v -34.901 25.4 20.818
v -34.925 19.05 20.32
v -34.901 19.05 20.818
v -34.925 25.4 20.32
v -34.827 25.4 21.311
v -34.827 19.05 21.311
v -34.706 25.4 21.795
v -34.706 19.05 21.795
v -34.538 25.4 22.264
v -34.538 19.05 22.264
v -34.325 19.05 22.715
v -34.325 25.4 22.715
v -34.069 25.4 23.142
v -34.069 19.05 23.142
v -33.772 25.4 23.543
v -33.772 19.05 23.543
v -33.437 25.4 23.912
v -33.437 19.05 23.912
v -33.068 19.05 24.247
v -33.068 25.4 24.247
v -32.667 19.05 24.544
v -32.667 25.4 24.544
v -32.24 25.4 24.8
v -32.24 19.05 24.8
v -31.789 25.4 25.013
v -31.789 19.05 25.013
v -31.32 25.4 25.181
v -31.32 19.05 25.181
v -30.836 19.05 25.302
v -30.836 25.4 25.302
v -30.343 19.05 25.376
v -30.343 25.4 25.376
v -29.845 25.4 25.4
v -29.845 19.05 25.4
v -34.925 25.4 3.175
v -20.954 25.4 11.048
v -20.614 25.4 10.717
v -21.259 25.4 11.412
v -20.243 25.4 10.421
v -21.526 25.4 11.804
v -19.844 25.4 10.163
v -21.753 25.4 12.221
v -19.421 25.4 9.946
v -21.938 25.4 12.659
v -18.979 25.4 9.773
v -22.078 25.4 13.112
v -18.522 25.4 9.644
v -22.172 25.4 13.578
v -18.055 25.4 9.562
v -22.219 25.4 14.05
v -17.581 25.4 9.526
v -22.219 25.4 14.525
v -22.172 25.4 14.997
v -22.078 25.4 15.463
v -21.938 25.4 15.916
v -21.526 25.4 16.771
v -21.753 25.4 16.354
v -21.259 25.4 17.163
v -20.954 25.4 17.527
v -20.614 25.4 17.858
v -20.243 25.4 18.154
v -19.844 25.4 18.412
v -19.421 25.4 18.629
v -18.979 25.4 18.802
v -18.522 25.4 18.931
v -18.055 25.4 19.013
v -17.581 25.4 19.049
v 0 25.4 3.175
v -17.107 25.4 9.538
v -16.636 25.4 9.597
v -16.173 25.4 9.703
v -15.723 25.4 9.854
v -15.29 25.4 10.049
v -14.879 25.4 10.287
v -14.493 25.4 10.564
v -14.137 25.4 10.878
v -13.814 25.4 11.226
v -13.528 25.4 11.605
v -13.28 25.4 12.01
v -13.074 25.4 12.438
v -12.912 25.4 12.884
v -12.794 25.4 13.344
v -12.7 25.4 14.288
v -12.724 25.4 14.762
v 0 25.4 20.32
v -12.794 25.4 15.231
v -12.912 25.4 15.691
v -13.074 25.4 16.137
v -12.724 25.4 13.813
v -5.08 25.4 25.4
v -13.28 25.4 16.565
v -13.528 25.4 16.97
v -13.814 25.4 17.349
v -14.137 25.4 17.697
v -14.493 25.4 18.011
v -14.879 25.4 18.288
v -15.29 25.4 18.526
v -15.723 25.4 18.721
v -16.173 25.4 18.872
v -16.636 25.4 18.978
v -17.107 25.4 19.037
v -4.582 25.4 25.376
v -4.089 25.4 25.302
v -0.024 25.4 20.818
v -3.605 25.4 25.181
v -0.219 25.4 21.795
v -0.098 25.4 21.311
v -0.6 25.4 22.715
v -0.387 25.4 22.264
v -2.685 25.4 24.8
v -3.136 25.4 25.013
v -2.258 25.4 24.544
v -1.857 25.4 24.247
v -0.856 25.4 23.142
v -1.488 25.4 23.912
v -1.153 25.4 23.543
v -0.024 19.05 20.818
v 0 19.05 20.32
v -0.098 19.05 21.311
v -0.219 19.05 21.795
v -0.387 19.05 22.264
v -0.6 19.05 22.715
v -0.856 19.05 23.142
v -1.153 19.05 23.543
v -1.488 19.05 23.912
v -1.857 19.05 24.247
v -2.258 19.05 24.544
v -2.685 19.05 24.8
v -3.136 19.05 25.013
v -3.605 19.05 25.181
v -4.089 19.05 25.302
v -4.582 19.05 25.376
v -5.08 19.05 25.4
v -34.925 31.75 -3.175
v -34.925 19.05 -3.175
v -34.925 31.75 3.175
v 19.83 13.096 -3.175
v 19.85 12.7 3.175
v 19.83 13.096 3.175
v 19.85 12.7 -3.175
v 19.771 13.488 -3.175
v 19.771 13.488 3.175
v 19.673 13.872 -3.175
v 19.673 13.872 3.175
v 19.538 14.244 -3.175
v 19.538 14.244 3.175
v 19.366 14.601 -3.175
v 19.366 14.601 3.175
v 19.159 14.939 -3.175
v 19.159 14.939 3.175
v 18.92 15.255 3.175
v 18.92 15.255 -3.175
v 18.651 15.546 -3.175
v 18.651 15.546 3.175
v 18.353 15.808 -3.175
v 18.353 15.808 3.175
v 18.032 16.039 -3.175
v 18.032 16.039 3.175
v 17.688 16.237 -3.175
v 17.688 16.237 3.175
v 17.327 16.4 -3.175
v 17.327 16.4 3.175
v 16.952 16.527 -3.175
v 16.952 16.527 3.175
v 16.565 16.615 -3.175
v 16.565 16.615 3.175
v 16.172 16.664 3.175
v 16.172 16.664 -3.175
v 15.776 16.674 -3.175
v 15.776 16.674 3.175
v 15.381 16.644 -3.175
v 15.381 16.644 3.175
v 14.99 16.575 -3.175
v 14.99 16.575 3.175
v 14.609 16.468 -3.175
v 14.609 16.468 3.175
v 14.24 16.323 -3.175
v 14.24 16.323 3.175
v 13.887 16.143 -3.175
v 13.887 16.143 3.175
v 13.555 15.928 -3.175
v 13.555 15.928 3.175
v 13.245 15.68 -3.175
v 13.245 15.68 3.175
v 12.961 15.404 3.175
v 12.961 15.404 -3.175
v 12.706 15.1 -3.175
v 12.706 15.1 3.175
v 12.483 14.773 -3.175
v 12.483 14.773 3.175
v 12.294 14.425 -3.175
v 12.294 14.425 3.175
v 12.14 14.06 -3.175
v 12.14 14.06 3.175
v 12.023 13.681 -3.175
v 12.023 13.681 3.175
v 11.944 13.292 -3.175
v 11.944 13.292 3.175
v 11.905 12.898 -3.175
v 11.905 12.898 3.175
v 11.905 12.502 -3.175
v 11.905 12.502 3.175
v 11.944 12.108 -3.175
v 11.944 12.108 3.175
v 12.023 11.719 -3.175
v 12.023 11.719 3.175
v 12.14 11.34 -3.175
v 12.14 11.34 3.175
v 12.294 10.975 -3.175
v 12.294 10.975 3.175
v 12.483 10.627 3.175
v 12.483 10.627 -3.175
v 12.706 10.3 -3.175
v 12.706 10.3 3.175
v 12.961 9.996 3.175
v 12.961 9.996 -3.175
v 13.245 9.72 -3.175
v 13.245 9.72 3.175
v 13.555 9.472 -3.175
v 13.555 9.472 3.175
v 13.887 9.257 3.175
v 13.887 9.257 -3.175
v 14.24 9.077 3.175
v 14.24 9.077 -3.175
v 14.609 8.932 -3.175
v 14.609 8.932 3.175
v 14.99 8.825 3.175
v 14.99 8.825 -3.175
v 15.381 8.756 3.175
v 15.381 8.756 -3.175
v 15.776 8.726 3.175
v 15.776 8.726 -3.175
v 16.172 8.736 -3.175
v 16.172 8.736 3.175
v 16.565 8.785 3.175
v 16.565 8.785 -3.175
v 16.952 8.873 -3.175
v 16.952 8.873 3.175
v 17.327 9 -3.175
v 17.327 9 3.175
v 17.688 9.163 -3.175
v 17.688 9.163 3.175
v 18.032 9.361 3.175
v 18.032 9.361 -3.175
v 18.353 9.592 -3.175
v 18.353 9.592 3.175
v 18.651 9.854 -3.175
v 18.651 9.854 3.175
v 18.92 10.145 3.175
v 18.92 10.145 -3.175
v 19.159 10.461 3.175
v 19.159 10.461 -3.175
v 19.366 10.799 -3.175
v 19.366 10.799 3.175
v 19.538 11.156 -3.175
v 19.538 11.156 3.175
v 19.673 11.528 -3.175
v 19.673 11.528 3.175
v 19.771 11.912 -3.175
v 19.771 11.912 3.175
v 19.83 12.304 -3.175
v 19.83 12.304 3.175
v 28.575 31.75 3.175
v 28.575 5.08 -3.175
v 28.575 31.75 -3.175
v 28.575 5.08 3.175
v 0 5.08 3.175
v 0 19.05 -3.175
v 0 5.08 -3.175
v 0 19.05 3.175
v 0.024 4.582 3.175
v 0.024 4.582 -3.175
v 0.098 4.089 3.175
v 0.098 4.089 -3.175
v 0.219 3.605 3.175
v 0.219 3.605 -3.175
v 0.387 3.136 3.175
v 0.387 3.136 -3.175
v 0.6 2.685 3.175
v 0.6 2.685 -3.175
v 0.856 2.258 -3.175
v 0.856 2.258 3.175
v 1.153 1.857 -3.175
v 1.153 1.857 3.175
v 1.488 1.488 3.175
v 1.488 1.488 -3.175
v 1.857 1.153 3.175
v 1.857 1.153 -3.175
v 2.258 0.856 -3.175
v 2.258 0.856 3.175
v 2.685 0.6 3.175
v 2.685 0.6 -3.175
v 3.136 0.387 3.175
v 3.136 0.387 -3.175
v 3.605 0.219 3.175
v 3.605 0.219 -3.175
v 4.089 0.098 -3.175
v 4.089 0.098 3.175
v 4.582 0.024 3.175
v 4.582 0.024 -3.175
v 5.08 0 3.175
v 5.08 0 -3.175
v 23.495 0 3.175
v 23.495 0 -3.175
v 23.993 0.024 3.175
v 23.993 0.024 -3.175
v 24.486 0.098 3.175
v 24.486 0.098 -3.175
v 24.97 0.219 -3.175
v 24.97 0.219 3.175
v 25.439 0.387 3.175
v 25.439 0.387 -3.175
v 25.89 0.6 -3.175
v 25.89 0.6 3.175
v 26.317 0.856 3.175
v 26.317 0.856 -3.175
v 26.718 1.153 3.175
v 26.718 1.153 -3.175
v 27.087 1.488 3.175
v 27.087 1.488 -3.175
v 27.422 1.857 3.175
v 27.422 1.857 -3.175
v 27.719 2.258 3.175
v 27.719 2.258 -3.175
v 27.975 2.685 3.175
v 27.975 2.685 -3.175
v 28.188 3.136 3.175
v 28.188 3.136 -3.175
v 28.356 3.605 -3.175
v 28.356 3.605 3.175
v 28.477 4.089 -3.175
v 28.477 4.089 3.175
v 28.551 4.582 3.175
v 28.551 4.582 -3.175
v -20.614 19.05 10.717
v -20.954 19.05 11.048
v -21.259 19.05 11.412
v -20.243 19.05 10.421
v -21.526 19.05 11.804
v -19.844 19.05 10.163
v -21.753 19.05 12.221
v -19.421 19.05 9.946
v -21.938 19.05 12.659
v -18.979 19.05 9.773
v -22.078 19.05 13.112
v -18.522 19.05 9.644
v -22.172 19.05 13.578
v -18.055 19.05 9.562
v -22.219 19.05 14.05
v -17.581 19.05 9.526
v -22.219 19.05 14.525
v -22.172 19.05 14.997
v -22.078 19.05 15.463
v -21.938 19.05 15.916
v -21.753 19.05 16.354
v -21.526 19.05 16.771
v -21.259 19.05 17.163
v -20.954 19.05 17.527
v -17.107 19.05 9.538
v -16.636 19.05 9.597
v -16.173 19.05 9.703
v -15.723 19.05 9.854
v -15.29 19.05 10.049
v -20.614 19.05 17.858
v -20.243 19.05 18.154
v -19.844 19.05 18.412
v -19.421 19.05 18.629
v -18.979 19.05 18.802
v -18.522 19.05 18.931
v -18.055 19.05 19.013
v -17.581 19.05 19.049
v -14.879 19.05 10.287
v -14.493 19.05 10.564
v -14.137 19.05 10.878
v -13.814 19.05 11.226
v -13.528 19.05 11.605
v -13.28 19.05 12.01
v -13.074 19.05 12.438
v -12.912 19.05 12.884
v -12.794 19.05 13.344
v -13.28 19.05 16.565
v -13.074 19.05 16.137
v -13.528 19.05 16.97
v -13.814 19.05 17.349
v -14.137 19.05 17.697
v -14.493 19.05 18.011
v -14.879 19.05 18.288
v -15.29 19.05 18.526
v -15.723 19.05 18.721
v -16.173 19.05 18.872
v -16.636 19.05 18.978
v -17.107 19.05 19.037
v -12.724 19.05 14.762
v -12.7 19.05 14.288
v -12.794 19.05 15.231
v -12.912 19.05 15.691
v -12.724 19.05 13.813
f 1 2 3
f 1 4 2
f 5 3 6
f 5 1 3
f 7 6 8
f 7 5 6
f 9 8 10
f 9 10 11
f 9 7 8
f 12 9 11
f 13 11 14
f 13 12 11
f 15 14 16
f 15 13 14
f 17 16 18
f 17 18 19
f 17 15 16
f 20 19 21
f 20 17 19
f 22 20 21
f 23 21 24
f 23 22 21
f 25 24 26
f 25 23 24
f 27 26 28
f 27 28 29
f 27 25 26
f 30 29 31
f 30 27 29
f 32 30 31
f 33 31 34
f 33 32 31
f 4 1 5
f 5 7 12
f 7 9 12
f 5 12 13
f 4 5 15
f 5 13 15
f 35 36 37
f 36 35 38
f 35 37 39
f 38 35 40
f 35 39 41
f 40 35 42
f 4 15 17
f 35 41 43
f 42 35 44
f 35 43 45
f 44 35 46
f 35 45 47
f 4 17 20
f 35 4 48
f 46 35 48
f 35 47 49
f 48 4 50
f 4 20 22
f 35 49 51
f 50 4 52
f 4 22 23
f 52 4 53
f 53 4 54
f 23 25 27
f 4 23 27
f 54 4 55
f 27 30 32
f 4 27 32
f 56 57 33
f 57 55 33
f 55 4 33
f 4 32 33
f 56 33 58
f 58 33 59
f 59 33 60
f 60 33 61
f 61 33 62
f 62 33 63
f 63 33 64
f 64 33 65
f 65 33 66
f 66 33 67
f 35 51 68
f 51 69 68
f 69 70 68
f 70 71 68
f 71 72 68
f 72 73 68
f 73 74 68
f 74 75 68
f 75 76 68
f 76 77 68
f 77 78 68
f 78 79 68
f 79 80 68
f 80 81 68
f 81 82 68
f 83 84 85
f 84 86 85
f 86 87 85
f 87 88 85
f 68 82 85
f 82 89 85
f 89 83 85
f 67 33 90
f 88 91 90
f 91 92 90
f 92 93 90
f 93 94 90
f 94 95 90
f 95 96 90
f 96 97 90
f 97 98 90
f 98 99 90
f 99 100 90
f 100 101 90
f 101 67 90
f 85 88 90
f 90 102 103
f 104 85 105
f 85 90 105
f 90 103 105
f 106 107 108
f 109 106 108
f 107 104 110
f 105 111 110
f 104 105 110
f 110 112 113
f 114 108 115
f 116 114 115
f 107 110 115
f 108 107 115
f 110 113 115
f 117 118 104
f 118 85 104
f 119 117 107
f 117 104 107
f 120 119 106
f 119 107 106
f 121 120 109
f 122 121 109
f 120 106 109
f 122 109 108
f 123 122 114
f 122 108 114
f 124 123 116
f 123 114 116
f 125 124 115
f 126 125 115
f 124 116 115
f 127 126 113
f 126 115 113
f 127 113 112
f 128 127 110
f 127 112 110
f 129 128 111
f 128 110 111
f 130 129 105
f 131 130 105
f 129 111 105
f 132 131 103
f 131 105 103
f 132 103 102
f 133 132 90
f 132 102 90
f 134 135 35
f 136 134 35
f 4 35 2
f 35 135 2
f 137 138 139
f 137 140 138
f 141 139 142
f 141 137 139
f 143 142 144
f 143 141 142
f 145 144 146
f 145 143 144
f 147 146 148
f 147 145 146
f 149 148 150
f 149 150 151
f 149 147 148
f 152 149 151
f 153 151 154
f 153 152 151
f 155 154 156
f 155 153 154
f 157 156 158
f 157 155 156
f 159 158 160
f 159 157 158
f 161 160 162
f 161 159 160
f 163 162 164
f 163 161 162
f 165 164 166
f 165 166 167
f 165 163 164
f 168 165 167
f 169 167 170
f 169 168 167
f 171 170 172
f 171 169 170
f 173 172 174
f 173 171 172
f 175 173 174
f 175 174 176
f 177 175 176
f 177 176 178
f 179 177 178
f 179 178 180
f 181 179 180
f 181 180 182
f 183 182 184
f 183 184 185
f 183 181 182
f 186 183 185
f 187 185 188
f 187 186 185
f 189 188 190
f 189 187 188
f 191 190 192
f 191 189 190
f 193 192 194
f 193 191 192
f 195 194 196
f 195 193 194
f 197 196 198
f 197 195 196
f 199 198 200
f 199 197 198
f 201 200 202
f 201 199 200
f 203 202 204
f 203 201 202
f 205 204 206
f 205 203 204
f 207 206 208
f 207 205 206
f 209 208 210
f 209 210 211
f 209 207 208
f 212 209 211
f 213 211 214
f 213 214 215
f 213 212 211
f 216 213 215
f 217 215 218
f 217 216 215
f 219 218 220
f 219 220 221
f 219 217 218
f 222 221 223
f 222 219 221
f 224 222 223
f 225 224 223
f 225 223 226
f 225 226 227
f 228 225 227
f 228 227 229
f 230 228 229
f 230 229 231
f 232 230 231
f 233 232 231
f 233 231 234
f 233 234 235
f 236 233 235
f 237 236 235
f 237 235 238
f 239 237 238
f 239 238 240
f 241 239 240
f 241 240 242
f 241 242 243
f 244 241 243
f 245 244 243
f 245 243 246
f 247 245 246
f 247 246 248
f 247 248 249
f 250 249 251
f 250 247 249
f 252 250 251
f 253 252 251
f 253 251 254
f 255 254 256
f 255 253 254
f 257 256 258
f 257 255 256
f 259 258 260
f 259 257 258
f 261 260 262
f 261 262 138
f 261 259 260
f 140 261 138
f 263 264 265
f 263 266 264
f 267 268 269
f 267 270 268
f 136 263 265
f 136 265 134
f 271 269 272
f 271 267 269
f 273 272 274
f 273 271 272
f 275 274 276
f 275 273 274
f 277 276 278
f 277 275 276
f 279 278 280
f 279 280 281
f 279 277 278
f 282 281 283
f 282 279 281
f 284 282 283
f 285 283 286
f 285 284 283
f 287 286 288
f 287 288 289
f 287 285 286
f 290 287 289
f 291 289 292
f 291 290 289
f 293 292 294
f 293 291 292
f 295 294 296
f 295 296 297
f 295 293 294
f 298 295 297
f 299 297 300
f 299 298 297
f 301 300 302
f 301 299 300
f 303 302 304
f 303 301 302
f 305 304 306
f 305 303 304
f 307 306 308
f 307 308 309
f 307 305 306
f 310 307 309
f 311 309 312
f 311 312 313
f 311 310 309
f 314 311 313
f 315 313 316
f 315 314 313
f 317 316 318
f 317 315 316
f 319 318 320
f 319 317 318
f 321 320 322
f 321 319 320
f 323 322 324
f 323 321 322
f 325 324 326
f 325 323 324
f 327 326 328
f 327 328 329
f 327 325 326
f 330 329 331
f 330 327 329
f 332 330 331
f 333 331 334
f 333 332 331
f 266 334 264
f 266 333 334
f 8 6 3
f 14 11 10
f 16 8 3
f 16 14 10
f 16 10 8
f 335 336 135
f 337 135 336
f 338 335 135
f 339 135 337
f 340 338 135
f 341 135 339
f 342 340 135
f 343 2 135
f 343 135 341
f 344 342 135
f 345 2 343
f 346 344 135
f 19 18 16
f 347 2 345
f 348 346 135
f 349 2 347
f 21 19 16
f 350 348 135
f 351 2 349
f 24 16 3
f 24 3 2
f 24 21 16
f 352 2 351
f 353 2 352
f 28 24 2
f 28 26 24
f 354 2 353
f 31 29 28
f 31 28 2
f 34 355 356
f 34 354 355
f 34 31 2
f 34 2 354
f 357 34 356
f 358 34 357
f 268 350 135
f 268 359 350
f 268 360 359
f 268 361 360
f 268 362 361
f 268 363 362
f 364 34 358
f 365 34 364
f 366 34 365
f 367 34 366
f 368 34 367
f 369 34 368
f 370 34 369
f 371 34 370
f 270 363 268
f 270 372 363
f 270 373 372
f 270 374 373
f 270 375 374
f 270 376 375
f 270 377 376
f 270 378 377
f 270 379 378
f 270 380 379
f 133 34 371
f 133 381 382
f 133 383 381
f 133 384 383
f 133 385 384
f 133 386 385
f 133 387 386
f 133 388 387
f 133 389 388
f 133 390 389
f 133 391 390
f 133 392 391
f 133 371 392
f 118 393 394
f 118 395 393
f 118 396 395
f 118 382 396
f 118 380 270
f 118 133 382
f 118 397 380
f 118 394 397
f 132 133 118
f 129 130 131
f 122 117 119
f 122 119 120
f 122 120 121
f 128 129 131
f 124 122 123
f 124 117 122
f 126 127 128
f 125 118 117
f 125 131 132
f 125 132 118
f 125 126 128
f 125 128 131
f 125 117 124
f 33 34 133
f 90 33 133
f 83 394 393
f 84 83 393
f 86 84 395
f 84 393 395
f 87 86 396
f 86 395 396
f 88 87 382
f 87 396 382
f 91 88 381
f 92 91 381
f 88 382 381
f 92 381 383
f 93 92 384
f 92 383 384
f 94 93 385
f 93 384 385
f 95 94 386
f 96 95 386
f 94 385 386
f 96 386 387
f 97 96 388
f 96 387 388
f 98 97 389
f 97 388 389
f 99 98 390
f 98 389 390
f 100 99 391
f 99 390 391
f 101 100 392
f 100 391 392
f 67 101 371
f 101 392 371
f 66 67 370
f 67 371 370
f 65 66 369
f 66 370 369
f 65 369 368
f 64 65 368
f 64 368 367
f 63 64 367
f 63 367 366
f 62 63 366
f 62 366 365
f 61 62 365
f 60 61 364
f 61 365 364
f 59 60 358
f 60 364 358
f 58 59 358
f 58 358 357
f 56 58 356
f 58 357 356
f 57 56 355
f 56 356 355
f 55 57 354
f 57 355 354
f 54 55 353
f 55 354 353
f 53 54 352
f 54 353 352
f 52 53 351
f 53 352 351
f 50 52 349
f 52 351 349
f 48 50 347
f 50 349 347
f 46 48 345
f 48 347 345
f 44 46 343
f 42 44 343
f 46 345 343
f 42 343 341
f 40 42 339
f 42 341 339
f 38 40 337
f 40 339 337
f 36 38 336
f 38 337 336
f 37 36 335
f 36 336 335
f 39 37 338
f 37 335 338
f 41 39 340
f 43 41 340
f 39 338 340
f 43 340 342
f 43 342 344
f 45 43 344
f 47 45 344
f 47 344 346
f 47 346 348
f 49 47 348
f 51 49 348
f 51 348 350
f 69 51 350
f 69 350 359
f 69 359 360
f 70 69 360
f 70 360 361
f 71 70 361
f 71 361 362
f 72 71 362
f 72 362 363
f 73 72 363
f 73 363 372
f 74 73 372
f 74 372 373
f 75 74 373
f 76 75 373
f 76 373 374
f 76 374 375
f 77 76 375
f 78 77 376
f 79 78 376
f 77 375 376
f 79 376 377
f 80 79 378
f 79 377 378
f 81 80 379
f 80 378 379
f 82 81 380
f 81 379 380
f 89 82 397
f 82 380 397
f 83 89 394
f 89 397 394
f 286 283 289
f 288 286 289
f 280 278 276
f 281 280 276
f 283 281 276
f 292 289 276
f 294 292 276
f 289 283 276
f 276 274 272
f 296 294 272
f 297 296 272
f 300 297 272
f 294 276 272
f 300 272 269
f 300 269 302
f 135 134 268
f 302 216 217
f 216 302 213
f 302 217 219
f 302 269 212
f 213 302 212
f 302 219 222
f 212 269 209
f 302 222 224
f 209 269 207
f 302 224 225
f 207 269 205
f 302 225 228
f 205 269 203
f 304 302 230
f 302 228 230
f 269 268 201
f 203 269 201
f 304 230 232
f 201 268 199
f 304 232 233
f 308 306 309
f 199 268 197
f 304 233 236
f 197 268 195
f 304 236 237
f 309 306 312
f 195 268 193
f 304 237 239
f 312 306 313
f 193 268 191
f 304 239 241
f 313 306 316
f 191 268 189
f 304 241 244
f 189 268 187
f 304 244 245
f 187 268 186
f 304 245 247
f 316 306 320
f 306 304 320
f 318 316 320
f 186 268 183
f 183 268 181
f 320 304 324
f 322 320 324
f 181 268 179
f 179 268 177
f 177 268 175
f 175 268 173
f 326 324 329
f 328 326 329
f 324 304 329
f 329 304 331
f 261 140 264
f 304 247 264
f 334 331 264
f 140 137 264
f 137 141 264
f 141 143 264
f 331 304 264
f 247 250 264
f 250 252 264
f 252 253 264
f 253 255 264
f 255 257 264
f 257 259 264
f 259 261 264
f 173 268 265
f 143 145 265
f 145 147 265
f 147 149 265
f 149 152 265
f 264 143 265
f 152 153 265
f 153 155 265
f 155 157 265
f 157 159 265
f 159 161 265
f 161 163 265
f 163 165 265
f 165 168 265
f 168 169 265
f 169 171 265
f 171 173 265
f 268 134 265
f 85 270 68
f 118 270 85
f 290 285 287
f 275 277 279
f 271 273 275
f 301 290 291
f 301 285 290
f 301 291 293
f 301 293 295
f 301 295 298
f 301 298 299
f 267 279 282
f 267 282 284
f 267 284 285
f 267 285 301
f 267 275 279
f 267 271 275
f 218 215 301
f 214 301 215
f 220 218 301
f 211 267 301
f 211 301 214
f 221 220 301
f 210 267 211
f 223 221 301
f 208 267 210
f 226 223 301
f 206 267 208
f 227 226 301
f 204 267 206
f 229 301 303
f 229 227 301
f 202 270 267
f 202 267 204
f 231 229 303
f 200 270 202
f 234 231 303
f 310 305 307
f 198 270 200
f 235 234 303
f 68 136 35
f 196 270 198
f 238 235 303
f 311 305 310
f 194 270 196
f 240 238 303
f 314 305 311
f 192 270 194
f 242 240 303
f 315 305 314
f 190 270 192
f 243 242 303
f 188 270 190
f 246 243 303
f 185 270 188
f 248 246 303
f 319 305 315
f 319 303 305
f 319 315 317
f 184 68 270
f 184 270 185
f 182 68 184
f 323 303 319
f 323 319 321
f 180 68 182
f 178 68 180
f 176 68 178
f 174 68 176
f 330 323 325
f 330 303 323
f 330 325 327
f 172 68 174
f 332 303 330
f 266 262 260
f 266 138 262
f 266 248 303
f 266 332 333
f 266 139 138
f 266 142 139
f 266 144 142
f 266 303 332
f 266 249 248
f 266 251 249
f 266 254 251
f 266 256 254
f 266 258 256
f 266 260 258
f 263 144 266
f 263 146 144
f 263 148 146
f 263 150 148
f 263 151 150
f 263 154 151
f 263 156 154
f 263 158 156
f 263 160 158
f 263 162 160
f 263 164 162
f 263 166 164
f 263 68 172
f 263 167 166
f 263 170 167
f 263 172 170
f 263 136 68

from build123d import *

# Parameters (mm, degrees)
F0_R     = 3.9751
F1_DEPTH = 3.175
F2_W     = 34.925
F2_H     = 22.225
F2_R     = 4.7625
F3_DEPTH = 6.35
F4_R     = 5.08


with BuildPart() as f1:
    # F0 (on Top) → F1 (new body, symmetric)
    with BuildSketch(Plane.XY):
        Polygon((0, 19.05), (0, 0), (28.575, 0), (28.575, 31.75), (-34.925, 31.75), (-34.925, 19.05), align=None)
        with Locations((15.875, 12.7)):
            Circle(F0_R, mode=Mode.SUBTRACT)
    extrude(amount=F1_DEPTH, both=True)

    # F2 (on face) → F3 (join)
    with BuildSketch(Plane.XZ.offset(-19.05)):
        with Locations((-17.4625, 14.2875)):
            Rectangle(F2_W, F2_H)
        with Locations((-17.4625, 14.2875)):
            Circle(F2_R, mode=Mode.SUBTRACT)
    extrude(amount=-F3_DEPTH)

    # F4
    f4_edges = [f1.edges().sort_by_distance(p)[0] for p in [
        (-34.925, 22.225, 25.4),
        (0, 22.225, 25.4),
        (0, 0, 0),
        (28.575, 0, 0),
    ]]
    fillet(f4_edges, radius=F4_R)


solid = f1.part
